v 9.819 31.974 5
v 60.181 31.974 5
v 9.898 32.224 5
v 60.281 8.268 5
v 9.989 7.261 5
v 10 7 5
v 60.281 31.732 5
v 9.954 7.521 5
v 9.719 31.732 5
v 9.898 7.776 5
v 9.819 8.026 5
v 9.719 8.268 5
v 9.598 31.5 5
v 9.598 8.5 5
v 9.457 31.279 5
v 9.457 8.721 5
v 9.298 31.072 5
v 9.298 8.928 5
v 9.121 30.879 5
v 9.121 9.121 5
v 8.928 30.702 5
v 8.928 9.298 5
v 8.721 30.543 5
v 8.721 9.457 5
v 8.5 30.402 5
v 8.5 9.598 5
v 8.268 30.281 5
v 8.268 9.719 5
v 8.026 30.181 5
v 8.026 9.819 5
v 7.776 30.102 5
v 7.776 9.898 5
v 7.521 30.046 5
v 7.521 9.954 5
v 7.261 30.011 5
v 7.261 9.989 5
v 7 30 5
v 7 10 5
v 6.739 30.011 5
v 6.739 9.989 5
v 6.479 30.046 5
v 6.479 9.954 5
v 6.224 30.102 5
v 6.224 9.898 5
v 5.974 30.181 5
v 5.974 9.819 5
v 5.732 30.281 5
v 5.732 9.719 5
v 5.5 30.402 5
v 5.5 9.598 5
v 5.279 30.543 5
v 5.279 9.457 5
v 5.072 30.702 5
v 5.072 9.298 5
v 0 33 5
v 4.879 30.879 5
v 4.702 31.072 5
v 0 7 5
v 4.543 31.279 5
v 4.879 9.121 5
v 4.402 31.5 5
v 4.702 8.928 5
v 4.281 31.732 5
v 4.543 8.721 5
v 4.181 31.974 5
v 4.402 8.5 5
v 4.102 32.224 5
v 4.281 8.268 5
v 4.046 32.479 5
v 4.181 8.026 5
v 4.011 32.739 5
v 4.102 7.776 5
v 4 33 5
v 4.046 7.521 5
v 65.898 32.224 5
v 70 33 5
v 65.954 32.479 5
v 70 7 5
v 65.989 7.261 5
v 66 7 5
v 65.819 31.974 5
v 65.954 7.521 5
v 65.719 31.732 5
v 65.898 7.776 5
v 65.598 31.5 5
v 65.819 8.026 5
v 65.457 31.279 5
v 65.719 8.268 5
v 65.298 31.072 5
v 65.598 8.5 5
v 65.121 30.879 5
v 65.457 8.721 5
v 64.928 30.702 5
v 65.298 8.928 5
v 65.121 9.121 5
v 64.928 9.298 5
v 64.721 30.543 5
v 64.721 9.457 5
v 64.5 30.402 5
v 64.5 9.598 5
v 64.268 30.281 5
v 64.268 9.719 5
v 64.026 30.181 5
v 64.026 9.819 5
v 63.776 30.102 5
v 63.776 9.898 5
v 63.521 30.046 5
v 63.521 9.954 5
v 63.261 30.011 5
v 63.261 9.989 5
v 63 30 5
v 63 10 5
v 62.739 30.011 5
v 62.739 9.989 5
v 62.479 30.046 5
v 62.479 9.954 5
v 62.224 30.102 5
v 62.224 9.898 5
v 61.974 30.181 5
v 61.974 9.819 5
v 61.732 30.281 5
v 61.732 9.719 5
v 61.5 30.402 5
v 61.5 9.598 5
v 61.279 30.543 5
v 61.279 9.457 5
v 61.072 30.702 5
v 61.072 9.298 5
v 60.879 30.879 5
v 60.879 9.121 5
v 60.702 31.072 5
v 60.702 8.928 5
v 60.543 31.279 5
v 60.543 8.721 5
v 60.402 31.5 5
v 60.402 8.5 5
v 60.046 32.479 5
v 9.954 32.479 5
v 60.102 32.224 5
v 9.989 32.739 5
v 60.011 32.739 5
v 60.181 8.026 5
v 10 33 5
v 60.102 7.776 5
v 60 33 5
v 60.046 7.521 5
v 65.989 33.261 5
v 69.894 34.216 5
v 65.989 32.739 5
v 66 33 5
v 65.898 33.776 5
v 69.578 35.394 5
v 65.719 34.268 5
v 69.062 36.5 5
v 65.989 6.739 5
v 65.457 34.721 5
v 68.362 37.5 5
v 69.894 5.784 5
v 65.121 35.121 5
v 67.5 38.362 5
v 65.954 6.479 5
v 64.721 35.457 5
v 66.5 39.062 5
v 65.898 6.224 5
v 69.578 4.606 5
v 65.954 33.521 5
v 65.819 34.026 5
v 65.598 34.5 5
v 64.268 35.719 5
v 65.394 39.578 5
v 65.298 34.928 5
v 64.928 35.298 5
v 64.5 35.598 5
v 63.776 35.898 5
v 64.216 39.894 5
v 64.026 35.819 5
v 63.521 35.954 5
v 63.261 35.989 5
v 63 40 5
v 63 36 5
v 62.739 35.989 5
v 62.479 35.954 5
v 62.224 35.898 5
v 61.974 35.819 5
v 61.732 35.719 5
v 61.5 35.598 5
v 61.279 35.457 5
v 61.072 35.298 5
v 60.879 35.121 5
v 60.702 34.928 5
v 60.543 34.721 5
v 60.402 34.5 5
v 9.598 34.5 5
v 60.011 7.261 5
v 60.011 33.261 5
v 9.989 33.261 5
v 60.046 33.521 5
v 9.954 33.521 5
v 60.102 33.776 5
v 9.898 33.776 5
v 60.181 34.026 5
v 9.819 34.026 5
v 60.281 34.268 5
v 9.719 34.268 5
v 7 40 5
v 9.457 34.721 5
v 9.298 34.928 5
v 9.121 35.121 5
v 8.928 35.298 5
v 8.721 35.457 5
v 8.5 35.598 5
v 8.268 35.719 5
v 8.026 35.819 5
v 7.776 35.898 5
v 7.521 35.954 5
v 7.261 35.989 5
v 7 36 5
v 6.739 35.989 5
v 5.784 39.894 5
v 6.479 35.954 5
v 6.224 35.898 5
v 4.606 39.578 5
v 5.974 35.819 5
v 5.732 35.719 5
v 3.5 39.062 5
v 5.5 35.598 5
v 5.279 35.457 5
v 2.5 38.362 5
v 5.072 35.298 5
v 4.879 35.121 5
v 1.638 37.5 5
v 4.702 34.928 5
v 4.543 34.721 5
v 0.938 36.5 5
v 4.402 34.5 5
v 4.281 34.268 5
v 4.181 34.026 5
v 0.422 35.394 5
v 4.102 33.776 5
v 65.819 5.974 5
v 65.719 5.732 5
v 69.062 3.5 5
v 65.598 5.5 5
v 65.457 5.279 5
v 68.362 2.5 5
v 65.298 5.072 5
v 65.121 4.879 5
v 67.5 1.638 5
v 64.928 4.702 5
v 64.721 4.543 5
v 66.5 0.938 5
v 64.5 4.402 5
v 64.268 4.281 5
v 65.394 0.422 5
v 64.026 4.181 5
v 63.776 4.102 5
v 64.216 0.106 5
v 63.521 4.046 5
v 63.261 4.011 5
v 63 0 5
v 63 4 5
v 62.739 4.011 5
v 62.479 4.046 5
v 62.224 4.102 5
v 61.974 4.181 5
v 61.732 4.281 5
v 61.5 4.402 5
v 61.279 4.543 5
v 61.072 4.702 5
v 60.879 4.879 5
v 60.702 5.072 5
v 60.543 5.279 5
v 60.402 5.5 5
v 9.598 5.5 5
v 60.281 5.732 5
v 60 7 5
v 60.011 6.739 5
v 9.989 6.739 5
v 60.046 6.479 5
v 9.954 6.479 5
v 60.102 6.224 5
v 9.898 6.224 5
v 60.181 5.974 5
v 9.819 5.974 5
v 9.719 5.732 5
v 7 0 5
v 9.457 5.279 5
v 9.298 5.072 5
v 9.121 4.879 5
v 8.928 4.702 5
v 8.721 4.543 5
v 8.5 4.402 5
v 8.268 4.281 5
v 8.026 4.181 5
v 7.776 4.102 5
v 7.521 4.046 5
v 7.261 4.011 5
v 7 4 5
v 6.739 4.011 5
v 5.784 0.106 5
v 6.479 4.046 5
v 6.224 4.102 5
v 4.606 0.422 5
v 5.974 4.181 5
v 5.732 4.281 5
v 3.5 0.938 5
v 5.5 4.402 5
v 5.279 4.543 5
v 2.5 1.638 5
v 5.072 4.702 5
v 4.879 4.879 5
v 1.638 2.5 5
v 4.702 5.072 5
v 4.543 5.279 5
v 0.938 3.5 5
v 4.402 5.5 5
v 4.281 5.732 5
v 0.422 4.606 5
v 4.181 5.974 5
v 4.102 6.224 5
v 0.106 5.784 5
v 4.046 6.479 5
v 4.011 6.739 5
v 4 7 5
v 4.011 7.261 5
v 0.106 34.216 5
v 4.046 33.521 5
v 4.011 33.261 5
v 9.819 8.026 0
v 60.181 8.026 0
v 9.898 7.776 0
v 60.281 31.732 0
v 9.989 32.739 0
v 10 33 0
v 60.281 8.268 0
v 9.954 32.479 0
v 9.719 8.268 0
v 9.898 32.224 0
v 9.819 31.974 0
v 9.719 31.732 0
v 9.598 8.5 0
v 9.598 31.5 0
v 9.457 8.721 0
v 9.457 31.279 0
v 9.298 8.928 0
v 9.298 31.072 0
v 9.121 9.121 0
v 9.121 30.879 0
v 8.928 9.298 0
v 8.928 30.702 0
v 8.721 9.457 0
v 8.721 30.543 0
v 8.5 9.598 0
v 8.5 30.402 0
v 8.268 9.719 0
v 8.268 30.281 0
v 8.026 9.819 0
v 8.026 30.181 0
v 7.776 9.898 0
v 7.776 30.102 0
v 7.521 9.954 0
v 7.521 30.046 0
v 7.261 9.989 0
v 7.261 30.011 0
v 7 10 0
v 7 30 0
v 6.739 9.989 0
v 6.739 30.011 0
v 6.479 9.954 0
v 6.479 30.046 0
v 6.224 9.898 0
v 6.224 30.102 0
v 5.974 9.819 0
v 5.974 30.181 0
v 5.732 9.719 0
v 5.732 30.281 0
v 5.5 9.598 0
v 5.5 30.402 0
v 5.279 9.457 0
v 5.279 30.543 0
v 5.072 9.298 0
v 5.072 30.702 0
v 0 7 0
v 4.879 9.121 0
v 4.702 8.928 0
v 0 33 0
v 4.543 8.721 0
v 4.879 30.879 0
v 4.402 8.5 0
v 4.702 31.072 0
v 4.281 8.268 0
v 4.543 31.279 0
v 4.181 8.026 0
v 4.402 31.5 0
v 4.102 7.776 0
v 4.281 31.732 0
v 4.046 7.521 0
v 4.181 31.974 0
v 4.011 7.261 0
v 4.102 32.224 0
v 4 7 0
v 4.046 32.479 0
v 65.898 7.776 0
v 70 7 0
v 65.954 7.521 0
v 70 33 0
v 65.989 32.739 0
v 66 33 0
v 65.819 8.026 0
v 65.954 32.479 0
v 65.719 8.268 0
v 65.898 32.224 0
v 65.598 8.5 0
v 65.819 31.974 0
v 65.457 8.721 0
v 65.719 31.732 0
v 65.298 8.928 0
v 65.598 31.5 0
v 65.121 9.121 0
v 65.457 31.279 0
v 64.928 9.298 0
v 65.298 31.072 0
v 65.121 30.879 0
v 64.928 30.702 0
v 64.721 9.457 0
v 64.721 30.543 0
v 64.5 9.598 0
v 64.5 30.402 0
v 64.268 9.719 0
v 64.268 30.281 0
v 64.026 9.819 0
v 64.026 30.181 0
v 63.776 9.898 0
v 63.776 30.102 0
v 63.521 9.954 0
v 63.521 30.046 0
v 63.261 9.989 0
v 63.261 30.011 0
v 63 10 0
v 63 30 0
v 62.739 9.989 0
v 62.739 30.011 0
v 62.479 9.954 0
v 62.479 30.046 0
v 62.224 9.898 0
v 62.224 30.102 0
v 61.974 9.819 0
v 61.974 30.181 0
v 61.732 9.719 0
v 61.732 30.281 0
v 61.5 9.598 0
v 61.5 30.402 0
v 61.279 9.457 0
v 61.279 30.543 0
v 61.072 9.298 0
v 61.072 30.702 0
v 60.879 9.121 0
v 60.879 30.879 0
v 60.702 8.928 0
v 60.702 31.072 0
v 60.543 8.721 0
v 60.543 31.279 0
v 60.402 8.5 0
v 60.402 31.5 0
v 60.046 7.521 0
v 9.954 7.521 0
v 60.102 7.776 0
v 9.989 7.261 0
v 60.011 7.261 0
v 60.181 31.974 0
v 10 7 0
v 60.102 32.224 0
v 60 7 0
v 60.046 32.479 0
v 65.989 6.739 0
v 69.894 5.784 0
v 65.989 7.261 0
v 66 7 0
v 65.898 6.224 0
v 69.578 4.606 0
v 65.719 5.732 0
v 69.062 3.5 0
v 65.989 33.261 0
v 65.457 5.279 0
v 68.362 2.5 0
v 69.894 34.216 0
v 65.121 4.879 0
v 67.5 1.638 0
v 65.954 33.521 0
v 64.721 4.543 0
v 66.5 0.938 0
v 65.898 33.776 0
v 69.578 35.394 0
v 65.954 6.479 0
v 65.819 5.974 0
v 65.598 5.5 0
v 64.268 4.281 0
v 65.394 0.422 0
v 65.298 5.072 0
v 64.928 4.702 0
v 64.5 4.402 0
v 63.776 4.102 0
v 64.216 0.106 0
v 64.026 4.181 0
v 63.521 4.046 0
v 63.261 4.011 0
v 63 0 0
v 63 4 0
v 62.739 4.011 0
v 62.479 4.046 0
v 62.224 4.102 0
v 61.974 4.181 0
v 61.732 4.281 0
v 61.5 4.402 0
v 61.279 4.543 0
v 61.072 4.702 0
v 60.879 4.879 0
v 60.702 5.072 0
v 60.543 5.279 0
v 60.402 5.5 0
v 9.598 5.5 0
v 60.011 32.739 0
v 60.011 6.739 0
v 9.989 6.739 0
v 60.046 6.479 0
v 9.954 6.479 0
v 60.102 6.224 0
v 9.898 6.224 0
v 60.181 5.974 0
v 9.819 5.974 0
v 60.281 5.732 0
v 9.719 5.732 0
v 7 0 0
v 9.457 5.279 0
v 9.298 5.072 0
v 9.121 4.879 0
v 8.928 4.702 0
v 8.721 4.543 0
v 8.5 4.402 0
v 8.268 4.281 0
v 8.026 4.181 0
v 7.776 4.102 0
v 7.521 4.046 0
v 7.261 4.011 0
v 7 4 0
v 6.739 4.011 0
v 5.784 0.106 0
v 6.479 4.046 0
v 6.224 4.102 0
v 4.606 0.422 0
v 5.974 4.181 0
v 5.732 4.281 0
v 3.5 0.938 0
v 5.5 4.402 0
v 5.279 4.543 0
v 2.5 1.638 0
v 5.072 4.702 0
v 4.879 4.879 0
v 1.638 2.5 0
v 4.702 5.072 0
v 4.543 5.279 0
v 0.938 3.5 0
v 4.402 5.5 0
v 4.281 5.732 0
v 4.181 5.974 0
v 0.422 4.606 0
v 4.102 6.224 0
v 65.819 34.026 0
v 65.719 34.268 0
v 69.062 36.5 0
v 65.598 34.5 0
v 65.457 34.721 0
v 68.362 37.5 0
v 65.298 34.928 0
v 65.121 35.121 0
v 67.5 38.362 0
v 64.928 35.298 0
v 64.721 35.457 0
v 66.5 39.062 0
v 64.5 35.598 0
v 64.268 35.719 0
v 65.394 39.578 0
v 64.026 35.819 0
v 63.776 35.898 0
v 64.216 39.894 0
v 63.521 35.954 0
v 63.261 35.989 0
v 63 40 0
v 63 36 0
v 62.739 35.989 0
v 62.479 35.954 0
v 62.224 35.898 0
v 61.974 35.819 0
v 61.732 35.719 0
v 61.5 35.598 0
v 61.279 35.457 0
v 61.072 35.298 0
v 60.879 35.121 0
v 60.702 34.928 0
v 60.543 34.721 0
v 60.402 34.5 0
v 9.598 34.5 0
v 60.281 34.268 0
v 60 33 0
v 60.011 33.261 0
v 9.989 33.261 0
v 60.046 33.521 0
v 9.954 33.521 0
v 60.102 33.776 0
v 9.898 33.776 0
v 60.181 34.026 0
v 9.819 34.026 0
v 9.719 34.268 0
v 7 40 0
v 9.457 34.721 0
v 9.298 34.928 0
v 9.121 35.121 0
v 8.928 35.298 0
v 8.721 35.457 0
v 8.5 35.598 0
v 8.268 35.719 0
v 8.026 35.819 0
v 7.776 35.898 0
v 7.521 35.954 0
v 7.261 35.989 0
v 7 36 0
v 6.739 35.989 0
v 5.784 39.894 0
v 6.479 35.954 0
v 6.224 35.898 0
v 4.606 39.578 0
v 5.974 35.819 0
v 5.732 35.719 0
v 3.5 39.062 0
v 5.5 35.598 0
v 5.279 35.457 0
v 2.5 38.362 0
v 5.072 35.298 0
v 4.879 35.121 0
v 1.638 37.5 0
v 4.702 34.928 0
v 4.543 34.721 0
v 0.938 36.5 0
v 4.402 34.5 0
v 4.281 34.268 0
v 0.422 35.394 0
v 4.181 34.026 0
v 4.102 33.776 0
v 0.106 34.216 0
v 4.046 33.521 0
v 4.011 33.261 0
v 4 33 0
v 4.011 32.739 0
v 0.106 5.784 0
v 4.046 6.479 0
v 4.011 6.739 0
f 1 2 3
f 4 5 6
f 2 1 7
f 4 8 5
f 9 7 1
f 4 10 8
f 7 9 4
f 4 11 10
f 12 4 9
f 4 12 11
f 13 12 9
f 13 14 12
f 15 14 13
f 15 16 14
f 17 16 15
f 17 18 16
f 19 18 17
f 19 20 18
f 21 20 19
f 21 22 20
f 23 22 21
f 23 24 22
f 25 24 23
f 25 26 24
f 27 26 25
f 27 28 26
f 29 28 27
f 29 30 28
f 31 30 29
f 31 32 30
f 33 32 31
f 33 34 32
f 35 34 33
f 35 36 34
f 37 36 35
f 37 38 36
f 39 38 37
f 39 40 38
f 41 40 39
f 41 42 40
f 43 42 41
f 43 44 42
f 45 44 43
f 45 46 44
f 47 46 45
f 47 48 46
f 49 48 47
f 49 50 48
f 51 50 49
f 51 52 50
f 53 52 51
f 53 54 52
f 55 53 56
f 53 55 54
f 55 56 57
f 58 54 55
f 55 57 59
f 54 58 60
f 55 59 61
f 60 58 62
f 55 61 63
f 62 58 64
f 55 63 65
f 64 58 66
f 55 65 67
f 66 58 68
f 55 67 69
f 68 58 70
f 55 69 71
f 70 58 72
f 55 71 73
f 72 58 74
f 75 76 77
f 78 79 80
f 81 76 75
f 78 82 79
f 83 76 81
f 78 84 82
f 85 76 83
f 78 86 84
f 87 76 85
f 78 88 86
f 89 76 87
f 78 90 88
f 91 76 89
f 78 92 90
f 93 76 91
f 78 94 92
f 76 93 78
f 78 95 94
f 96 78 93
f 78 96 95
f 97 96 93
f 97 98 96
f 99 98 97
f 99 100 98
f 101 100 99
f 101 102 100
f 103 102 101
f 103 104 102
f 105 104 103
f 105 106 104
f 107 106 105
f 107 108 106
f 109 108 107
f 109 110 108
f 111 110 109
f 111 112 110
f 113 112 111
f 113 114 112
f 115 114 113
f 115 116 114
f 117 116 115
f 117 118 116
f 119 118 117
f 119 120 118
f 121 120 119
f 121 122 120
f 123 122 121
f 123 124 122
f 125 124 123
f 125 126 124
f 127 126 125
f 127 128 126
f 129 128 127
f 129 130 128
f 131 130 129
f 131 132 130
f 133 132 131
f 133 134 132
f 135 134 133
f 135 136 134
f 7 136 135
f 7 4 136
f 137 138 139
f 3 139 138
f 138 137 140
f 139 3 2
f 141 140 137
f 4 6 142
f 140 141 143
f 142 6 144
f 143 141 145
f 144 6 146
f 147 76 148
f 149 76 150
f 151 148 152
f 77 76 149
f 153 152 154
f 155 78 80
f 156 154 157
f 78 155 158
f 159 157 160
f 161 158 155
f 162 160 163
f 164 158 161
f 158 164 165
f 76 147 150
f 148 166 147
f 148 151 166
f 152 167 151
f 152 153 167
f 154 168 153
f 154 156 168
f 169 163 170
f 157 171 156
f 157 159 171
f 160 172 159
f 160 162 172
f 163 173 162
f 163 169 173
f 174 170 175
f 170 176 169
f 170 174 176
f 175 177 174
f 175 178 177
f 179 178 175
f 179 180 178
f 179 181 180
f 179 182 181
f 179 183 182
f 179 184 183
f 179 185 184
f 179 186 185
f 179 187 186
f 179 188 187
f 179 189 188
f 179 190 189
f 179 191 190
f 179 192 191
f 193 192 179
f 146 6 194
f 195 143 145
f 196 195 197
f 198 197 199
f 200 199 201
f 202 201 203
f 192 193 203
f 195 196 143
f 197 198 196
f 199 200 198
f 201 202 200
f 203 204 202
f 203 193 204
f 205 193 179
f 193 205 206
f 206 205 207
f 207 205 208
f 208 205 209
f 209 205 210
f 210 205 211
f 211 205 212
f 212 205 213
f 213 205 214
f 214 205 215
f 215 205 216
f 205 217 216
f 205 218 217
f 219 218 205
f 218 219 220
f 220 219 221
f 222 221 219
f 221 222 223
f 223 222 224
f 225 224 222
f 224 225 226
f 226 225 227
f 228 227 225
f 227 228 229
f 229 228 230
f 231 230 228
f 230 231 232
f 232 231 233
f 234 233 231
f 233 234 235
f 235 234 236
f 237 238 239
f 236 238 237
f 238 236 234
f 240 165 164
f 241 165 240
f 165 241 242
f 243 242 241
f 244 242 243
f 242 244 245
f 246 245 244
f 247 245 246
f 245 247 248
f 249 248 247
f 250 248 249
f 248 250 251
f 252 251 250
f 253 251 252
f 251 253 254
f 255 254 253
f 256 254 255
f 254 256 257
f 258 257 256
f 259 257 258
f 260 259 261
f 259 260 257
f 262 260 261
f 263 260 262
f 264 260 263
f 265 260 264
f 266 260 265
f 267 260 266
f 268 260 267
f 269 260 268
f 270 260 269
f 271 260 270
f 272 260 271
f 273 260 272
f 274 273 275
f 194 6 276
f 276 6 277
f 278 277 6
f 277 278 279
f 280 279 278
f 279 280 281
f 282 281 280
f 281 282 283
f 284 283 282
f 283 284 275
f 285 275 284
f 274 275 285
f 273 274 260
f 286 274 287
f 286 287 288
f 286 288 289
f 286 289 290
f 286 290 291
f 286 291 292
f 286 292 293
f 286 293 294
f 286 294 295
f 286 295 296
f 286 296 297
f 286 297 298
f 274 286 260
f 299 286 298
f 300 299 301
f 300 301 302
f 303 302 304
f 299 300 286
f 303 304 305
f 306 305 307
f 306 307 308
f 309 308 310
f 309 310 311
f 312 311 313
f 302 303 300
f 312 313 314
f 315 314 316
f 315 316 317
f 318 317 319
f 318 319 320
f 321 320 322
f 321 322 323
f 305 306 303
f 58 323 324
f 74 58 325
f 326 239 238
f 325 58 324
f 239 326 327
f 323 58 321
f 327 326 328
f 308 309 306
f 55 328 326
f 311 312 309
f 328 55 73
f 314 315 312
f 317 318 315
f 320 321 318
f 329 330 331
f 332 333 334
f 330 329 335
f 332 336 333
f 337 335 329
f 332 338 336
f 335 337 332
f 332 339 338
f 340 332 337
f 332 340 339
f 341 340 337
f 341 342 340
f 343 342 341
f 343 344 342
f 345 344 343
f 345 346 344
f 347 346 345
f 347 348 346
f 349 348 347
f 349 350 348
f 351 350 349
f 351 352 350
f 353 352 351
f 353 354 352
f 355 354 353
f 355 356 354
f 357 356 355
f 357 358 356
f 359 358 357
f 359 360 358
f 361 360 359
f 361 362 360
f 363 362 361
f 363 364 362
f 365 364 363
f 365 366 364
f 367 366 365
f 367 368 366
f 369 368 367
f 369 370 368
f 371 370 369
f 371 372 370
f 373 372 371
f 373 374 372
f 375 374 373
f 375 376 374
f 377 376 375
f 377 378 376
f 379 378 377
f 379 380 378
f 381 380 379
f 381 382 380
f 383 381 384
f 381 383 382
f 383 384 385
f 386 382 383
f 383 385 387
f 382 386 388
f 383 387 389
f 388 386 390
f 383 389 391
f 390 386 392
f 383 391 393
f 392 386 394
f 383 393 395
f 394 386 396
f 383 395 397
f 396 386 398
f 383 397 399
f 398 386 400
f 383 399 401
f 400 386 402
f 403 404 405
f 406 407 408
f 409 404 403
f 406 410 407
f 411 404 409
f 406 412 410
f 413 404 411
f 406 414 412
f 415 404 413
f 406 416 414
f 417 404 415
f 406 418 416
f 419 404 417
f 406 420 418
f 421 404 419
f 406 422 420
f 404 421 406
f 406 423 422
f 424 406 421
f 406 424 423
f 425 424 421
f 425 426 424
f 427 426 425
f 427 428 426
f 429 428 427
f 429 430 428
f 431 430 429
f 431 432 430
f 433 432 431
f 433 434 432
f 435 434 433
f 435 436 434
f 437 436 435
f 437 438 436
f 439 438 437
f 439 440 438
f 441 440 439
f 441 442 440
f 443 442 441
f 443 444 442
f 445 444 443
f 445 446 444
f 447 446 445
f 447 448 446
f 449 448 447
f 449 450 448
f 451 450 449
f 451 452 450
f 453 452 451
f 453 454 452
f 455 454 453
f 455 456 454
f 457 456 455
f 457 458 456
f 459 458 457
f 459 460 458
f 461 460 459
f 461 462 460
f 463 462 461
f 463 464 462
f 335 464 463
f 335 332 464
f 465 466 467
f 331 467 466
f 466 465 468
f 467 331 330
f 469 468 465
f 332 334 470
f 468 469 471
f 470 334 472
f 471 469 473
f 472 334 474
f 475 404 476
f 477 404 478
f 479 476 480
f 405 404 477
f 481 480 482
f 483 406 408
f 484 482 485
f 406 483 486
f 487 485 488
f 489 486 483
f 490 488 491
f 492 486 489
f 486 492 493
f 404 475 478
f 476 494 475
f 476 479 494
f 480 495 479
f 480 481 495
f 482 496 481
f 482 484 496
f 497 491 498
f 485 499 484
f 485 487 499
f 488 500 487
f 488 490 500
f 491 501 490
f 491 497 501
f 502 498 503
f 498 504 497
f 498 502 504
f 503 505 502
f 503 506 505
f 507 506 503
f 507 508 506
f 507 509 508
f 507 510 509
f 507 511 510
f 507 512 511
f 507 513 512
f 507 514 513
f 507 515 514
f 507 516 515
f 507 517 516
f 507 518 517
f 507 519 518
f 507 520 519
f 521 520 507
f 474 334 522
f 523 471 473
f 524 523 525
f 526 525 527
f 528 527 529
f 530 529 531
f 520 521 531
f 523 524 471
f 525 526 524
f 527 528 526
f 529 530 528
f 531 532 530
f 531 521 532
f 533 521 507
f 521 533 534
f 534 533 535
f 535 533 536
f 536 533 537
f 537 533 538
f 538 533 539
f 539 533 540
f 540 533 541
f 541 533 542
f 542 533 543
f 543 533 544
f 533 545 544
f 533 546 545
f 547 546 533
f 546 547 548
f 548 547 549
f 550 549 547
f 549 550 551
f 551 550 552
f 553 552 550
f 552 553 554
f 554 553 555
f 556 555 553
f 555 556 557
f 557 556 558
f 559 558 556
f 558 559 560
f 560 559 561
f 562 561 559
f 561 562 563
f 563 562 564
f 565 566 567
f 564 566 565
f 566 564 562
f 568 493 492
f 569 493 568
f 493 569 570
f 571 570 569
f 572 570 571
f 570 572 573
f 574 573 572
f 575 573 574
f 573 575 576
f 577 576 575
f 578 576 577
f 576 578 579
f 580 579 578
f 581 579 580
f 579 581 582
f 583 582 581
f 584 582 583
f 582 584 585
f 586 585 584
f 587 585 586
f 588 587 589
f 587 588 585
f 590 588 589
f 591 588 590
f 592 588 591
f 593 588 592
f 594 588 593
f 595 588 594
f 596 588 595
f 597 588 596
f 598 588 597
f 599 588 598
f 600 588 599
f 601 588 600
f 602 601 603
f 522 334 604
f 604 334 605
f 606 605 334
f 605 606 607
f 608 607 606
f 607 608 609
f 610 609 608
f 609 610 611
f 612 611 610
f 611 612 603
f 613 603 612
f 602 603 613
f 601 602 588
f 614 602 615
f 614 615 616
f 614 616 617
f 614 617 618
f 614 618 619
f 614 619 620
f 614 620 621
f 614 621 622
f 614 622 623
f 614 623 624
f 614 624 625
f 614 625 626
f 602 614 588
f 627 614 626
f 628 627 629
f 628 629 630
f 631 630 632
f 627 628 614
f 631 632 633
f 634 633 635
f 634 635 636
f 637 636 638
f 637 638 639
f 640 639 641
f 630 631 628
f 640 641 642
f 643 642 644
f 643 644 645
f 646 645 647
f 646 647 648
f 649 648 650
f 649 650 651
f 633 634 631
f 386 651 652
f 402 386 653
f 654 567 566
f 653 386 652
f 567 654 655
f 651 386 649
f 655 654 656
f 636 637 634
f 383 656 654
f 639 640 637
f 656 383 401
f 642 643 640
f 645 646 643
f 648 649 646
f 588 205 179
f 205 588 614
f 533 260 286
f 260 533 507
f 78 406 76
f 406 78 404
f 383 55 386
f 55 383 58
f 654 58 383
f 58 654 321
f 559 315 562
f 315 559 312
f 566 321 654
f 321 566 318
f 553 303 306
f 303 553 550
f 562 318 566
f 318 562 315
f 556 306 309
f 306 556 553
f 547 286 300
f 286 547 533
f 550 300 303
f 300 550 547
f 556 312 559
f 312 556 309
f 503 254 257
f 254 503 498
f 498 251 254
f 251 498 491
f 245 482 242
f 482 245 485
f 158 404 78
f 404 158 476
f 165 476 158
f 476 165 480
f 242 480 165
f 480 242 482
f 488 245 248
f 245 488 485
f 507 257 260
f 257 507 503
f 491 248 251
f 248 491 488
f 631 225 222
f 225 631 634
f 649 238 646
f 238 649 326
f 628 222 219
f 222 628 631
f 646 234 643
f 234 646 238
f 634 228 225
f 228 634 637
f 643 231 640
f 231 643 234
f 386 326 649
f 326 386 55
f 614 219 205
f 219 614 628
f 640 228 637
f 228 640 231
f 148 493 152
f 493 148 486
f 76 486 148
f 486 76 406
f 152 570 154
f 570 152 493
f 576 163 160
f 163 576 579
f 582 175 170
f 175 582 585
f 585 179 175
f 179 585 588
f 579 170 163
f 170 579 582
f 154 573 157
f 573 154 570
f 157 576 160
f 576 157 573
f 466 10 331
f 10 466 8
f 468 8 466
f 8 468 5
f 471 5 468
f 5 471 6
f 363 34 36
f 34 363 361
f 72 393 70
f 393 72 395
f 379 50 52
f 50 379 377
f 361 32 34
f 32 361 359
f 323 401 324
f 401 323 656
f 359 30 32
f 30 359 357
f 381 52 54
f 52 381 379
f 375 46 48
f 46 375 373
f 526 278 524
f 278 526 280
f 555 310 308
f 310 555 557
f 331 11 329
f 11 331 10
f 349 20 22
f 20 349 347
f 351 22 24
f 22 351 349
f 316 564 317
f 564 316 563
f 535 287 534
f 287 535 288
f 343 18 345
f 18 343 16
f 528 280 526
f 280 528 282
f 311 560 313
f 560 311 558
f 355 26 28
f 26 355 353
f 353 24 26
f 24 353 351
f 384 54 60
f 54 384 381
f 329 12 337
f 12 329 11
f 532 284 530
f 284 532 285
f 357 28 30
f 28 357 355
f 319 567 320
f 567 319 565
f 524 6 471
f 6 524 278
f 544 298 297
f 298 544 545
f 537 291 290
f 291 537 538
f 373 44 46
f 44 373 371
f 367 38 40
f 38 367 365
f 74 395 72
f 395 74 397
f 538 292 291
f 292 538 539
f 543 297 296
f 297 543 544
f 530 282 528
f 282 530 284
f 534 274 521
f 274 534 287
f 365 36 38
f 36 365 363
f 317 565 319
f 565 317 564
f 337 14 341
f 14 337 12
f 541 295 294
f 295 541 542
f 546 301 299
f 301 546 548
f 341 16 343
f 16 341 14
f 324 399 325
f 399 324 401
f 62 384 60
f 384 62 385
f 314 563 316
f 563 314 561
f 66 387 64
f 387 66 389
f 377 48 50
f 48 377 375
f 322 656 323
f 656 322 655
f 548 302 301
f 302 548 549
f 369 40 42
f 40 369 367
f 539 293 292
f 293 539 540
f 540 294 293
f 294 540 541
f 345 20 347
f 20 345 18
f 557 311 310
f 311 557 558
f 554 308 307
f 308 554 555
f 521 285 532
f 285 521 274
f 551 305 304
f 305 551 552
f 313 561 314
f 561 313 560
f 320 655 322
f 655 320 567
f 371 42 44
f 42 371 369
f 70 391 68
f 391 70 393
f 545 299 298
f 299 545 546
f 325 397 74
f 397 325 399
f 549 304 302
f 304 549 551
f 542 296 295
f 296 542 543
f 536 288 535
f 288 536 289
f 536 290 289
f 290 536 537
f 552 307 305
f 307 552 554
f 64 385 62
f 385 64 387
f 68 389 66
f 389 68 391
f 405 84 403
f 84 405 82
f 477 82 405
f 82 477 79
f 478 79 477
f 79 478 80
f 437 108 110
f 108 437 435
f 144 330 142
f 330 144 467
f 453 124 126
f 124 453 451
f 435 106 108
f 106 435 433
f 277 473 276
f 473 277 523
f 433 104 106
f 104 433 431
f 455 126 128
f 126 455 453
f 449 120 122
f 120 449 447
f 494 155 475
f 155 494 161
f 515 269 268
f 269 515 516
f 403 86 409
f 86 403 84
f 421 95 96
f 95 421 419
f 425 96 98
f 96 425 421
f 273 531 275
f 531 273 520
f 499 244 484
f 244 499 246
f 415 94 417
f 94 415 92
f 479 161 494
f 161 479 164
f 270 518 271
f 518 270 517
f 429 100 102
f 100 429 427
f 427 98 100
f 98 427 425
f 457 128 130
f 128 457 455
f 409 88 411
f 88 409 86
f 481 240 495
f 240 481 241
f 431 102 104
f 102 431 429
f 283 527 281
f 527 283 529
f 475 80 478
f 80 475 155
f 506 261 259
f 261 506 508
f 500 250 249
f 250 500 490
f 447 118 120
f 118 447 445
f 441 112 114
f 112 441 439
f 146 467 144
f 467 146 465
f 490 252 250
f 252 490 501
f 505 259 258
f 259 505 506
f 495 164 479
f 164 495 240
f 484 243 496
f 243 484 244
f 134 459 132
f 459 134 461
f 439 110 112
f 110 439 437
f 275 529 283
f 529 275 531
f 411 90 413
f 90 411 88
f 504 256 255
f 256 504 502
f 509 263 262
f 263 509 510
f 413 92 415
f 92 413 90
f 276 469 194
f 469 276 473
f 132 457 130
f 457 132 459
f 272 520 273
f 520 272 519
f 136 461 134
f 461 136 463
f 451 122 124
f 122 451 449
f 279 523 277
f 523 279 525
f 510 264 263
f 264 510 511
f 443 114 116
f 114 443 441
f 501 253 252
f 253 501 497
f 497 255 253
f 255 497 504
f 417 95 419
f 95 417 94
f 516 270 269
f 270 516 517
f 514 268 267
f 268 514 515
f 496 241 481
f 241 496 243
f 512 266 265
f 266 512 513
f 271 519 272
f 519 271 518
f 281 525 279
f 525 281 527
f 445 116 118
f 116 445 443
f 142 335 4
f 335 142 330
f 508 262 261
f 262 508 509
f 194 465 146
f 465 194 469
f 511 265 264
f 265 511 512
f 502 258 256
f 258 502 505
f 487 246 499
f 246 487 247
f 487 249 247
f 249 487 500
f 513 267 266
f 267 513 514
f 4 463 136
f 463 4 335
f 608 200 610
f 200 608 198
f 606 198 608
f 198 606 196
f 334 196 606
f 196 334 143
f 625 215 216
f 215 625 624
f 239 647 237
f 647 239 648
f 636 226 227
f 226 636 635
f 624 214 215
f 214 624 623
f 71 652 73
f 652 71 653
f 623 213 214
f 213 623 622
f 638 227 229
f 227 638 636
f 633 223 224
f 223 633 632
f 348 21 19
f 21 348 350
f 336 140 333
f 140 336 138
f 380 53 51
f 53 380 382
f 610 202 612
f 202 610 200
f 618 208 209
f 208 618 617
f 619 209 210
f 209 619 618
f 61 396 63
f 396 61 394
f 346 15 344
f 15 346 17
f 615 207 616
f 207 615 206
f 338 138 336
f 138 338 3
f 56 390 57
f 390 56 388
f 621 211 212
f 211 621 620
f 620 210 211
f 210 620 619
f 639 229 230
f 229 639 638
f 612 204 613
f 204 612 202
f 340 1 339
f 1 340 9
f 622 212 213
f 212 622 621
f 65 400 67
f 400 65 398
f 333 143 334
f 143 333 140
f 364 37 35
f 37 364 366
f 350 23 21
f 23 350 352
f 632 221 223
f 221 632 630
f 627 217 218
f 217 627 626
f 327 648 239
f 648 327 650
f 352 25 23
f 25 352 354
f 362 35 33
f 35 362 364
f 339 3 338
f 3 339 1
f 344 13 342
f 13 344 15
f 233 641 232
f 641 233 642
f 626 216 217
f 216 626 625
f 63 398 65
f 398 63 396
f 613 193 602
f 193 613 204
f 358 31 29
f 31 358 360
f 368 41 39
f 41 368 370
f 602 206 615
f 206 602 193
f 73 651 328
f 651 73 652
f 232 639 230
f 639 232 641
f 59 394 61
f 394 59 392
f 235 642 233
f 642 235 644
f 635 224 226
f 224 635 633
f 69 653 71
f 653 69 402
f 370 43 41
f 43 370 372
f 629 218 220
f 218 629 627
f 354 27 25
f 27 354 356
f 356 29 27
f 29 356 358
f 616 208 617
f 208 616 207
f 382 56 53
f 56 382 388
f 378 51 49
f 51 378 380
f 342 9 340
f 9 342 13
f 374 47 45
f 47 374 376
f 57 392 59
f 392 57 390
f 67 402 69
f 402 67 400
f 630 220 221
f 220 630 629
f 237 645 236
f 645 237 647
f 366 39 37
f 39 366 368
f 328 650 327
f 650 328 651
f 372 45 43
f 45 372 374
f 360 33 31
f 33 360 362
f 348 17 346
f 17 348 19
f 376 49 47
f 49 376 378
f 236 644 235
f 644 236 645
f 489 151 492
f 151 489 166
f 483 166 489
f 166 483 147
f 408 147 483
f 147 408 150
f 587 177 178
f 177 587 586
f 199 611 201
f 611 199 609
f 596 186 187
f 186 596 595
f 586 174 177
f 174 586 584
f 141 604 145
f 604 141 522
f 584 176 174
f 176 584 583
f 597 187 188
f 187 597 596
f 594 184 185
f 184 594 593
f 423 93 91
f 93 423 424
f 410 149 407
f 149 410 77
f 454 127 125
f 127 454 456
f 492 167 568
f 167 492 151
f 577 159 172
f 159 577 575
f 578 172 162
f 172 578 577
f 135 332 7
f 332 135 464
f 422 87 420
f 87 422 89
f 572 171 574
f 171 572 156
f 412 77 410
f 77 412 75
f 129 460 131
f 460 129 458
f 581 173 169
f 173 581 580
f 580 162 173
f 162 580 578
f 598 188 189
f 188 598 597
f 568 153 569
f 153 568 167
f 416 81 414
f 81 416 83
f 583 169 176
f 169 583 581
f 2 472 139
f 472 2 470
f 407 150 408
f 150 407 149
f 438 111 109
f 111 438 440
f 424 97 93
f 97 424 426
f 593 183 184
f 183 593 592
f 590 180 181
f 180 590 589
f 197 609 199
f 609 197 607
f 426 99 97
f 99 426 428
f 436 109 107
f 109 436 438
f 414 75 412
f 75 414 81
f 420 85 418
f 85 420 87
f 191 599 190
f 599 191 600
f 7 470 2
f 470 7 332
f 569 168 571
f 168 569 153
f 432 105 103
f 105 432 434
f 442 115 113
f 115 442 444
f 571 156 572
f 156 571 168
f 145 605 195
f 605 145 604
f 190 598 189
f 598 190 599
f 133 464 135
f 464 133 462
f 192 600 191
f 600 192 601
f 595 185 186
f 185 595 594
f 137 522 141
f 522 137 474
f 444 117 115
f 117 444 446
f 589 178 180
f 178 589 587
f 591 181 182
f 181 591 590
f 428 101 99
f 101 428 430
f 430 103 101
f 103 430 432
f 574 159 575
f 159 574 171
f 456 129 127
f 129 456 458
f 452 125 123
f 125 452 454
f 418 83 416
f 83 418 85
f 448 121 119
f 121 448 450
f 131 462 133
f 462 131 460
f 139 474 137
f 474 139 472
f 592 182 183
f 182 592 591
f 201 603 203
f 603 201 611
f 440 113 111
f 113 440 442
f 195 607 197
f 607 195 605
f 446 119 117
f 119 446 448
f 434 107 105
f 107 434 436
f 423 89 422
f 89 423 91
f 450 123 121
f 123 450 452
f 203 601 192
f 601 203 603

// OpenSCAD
/*
 * Sumpod Holder Template
 *
 * See sumpod_pen_holder.scad for example usage.
 *
 * Copyright (c) 2012 Mark Hindess
 * License:
 *   Creative Commons Attribution-ShareAlike 3.0 Unported License
 *   http://creativecommons.org/licenses/by-sa/3.0
 */

module sumpod_holder(size = [70,40,18],
                     corner_radius = 7,
                     corner_hole_radius = 3) {
  depth = size[2];
  difference() {
    union() {
      translate([corner_radius,0,0])
        cube([size[0]-(corner_radius*2), size[1], depth],
               center = false);
      translate([0,corner_radius,0])
        cube([size[0], size[1]-(corner_radius*2), depth],
               center = false);
      translate([corner_radius,corner_radius, depth/2])
        cylinder(r=corner_radius, h = depth, center = true, $fn = 36);
      translate([size[0]-corner_radius,corner_radius, depth/2])
        cylinder(r=corner_radius, h = depth, center = true, $fn = 36);
      translate([corner_radius,size[1]-corner_radius, depth/2])
        cylinder(r=corner_radius, h = depth, center = true, $fn = 36);
      translate([size[0]-corner_radius, size[1]-corner_radius, depth/2])
        cylinder(r=corner_radius, h = depth, center = true, $fn = 36);
    }
    union() {
      translate([corner_radius, corner_radius, depth/2])
       cylinder(r = corner_hole_radius, h = depth*2, center = true, $fn = 72);
      translate([size[0]-corner_radius, corner_radius, depth/2])
       cylinder(r = corner_hole_radius, h = depth*2, center = true, $fn = 72);
      translate([corner_radius, size[1]-corner_radius, depth/2])
       cylinder(r = corner_hole_radius, h = depth*2, center = true, $fn = 72);
      translate([size[0]-corner_radius, size[1]-corner_radius, depth/2])
       cylinder(r = corner_hole_radius, h = depth*2, center = true, $fn = 72);
    }
  }
}

sumpod_holder([70,40,5]);
